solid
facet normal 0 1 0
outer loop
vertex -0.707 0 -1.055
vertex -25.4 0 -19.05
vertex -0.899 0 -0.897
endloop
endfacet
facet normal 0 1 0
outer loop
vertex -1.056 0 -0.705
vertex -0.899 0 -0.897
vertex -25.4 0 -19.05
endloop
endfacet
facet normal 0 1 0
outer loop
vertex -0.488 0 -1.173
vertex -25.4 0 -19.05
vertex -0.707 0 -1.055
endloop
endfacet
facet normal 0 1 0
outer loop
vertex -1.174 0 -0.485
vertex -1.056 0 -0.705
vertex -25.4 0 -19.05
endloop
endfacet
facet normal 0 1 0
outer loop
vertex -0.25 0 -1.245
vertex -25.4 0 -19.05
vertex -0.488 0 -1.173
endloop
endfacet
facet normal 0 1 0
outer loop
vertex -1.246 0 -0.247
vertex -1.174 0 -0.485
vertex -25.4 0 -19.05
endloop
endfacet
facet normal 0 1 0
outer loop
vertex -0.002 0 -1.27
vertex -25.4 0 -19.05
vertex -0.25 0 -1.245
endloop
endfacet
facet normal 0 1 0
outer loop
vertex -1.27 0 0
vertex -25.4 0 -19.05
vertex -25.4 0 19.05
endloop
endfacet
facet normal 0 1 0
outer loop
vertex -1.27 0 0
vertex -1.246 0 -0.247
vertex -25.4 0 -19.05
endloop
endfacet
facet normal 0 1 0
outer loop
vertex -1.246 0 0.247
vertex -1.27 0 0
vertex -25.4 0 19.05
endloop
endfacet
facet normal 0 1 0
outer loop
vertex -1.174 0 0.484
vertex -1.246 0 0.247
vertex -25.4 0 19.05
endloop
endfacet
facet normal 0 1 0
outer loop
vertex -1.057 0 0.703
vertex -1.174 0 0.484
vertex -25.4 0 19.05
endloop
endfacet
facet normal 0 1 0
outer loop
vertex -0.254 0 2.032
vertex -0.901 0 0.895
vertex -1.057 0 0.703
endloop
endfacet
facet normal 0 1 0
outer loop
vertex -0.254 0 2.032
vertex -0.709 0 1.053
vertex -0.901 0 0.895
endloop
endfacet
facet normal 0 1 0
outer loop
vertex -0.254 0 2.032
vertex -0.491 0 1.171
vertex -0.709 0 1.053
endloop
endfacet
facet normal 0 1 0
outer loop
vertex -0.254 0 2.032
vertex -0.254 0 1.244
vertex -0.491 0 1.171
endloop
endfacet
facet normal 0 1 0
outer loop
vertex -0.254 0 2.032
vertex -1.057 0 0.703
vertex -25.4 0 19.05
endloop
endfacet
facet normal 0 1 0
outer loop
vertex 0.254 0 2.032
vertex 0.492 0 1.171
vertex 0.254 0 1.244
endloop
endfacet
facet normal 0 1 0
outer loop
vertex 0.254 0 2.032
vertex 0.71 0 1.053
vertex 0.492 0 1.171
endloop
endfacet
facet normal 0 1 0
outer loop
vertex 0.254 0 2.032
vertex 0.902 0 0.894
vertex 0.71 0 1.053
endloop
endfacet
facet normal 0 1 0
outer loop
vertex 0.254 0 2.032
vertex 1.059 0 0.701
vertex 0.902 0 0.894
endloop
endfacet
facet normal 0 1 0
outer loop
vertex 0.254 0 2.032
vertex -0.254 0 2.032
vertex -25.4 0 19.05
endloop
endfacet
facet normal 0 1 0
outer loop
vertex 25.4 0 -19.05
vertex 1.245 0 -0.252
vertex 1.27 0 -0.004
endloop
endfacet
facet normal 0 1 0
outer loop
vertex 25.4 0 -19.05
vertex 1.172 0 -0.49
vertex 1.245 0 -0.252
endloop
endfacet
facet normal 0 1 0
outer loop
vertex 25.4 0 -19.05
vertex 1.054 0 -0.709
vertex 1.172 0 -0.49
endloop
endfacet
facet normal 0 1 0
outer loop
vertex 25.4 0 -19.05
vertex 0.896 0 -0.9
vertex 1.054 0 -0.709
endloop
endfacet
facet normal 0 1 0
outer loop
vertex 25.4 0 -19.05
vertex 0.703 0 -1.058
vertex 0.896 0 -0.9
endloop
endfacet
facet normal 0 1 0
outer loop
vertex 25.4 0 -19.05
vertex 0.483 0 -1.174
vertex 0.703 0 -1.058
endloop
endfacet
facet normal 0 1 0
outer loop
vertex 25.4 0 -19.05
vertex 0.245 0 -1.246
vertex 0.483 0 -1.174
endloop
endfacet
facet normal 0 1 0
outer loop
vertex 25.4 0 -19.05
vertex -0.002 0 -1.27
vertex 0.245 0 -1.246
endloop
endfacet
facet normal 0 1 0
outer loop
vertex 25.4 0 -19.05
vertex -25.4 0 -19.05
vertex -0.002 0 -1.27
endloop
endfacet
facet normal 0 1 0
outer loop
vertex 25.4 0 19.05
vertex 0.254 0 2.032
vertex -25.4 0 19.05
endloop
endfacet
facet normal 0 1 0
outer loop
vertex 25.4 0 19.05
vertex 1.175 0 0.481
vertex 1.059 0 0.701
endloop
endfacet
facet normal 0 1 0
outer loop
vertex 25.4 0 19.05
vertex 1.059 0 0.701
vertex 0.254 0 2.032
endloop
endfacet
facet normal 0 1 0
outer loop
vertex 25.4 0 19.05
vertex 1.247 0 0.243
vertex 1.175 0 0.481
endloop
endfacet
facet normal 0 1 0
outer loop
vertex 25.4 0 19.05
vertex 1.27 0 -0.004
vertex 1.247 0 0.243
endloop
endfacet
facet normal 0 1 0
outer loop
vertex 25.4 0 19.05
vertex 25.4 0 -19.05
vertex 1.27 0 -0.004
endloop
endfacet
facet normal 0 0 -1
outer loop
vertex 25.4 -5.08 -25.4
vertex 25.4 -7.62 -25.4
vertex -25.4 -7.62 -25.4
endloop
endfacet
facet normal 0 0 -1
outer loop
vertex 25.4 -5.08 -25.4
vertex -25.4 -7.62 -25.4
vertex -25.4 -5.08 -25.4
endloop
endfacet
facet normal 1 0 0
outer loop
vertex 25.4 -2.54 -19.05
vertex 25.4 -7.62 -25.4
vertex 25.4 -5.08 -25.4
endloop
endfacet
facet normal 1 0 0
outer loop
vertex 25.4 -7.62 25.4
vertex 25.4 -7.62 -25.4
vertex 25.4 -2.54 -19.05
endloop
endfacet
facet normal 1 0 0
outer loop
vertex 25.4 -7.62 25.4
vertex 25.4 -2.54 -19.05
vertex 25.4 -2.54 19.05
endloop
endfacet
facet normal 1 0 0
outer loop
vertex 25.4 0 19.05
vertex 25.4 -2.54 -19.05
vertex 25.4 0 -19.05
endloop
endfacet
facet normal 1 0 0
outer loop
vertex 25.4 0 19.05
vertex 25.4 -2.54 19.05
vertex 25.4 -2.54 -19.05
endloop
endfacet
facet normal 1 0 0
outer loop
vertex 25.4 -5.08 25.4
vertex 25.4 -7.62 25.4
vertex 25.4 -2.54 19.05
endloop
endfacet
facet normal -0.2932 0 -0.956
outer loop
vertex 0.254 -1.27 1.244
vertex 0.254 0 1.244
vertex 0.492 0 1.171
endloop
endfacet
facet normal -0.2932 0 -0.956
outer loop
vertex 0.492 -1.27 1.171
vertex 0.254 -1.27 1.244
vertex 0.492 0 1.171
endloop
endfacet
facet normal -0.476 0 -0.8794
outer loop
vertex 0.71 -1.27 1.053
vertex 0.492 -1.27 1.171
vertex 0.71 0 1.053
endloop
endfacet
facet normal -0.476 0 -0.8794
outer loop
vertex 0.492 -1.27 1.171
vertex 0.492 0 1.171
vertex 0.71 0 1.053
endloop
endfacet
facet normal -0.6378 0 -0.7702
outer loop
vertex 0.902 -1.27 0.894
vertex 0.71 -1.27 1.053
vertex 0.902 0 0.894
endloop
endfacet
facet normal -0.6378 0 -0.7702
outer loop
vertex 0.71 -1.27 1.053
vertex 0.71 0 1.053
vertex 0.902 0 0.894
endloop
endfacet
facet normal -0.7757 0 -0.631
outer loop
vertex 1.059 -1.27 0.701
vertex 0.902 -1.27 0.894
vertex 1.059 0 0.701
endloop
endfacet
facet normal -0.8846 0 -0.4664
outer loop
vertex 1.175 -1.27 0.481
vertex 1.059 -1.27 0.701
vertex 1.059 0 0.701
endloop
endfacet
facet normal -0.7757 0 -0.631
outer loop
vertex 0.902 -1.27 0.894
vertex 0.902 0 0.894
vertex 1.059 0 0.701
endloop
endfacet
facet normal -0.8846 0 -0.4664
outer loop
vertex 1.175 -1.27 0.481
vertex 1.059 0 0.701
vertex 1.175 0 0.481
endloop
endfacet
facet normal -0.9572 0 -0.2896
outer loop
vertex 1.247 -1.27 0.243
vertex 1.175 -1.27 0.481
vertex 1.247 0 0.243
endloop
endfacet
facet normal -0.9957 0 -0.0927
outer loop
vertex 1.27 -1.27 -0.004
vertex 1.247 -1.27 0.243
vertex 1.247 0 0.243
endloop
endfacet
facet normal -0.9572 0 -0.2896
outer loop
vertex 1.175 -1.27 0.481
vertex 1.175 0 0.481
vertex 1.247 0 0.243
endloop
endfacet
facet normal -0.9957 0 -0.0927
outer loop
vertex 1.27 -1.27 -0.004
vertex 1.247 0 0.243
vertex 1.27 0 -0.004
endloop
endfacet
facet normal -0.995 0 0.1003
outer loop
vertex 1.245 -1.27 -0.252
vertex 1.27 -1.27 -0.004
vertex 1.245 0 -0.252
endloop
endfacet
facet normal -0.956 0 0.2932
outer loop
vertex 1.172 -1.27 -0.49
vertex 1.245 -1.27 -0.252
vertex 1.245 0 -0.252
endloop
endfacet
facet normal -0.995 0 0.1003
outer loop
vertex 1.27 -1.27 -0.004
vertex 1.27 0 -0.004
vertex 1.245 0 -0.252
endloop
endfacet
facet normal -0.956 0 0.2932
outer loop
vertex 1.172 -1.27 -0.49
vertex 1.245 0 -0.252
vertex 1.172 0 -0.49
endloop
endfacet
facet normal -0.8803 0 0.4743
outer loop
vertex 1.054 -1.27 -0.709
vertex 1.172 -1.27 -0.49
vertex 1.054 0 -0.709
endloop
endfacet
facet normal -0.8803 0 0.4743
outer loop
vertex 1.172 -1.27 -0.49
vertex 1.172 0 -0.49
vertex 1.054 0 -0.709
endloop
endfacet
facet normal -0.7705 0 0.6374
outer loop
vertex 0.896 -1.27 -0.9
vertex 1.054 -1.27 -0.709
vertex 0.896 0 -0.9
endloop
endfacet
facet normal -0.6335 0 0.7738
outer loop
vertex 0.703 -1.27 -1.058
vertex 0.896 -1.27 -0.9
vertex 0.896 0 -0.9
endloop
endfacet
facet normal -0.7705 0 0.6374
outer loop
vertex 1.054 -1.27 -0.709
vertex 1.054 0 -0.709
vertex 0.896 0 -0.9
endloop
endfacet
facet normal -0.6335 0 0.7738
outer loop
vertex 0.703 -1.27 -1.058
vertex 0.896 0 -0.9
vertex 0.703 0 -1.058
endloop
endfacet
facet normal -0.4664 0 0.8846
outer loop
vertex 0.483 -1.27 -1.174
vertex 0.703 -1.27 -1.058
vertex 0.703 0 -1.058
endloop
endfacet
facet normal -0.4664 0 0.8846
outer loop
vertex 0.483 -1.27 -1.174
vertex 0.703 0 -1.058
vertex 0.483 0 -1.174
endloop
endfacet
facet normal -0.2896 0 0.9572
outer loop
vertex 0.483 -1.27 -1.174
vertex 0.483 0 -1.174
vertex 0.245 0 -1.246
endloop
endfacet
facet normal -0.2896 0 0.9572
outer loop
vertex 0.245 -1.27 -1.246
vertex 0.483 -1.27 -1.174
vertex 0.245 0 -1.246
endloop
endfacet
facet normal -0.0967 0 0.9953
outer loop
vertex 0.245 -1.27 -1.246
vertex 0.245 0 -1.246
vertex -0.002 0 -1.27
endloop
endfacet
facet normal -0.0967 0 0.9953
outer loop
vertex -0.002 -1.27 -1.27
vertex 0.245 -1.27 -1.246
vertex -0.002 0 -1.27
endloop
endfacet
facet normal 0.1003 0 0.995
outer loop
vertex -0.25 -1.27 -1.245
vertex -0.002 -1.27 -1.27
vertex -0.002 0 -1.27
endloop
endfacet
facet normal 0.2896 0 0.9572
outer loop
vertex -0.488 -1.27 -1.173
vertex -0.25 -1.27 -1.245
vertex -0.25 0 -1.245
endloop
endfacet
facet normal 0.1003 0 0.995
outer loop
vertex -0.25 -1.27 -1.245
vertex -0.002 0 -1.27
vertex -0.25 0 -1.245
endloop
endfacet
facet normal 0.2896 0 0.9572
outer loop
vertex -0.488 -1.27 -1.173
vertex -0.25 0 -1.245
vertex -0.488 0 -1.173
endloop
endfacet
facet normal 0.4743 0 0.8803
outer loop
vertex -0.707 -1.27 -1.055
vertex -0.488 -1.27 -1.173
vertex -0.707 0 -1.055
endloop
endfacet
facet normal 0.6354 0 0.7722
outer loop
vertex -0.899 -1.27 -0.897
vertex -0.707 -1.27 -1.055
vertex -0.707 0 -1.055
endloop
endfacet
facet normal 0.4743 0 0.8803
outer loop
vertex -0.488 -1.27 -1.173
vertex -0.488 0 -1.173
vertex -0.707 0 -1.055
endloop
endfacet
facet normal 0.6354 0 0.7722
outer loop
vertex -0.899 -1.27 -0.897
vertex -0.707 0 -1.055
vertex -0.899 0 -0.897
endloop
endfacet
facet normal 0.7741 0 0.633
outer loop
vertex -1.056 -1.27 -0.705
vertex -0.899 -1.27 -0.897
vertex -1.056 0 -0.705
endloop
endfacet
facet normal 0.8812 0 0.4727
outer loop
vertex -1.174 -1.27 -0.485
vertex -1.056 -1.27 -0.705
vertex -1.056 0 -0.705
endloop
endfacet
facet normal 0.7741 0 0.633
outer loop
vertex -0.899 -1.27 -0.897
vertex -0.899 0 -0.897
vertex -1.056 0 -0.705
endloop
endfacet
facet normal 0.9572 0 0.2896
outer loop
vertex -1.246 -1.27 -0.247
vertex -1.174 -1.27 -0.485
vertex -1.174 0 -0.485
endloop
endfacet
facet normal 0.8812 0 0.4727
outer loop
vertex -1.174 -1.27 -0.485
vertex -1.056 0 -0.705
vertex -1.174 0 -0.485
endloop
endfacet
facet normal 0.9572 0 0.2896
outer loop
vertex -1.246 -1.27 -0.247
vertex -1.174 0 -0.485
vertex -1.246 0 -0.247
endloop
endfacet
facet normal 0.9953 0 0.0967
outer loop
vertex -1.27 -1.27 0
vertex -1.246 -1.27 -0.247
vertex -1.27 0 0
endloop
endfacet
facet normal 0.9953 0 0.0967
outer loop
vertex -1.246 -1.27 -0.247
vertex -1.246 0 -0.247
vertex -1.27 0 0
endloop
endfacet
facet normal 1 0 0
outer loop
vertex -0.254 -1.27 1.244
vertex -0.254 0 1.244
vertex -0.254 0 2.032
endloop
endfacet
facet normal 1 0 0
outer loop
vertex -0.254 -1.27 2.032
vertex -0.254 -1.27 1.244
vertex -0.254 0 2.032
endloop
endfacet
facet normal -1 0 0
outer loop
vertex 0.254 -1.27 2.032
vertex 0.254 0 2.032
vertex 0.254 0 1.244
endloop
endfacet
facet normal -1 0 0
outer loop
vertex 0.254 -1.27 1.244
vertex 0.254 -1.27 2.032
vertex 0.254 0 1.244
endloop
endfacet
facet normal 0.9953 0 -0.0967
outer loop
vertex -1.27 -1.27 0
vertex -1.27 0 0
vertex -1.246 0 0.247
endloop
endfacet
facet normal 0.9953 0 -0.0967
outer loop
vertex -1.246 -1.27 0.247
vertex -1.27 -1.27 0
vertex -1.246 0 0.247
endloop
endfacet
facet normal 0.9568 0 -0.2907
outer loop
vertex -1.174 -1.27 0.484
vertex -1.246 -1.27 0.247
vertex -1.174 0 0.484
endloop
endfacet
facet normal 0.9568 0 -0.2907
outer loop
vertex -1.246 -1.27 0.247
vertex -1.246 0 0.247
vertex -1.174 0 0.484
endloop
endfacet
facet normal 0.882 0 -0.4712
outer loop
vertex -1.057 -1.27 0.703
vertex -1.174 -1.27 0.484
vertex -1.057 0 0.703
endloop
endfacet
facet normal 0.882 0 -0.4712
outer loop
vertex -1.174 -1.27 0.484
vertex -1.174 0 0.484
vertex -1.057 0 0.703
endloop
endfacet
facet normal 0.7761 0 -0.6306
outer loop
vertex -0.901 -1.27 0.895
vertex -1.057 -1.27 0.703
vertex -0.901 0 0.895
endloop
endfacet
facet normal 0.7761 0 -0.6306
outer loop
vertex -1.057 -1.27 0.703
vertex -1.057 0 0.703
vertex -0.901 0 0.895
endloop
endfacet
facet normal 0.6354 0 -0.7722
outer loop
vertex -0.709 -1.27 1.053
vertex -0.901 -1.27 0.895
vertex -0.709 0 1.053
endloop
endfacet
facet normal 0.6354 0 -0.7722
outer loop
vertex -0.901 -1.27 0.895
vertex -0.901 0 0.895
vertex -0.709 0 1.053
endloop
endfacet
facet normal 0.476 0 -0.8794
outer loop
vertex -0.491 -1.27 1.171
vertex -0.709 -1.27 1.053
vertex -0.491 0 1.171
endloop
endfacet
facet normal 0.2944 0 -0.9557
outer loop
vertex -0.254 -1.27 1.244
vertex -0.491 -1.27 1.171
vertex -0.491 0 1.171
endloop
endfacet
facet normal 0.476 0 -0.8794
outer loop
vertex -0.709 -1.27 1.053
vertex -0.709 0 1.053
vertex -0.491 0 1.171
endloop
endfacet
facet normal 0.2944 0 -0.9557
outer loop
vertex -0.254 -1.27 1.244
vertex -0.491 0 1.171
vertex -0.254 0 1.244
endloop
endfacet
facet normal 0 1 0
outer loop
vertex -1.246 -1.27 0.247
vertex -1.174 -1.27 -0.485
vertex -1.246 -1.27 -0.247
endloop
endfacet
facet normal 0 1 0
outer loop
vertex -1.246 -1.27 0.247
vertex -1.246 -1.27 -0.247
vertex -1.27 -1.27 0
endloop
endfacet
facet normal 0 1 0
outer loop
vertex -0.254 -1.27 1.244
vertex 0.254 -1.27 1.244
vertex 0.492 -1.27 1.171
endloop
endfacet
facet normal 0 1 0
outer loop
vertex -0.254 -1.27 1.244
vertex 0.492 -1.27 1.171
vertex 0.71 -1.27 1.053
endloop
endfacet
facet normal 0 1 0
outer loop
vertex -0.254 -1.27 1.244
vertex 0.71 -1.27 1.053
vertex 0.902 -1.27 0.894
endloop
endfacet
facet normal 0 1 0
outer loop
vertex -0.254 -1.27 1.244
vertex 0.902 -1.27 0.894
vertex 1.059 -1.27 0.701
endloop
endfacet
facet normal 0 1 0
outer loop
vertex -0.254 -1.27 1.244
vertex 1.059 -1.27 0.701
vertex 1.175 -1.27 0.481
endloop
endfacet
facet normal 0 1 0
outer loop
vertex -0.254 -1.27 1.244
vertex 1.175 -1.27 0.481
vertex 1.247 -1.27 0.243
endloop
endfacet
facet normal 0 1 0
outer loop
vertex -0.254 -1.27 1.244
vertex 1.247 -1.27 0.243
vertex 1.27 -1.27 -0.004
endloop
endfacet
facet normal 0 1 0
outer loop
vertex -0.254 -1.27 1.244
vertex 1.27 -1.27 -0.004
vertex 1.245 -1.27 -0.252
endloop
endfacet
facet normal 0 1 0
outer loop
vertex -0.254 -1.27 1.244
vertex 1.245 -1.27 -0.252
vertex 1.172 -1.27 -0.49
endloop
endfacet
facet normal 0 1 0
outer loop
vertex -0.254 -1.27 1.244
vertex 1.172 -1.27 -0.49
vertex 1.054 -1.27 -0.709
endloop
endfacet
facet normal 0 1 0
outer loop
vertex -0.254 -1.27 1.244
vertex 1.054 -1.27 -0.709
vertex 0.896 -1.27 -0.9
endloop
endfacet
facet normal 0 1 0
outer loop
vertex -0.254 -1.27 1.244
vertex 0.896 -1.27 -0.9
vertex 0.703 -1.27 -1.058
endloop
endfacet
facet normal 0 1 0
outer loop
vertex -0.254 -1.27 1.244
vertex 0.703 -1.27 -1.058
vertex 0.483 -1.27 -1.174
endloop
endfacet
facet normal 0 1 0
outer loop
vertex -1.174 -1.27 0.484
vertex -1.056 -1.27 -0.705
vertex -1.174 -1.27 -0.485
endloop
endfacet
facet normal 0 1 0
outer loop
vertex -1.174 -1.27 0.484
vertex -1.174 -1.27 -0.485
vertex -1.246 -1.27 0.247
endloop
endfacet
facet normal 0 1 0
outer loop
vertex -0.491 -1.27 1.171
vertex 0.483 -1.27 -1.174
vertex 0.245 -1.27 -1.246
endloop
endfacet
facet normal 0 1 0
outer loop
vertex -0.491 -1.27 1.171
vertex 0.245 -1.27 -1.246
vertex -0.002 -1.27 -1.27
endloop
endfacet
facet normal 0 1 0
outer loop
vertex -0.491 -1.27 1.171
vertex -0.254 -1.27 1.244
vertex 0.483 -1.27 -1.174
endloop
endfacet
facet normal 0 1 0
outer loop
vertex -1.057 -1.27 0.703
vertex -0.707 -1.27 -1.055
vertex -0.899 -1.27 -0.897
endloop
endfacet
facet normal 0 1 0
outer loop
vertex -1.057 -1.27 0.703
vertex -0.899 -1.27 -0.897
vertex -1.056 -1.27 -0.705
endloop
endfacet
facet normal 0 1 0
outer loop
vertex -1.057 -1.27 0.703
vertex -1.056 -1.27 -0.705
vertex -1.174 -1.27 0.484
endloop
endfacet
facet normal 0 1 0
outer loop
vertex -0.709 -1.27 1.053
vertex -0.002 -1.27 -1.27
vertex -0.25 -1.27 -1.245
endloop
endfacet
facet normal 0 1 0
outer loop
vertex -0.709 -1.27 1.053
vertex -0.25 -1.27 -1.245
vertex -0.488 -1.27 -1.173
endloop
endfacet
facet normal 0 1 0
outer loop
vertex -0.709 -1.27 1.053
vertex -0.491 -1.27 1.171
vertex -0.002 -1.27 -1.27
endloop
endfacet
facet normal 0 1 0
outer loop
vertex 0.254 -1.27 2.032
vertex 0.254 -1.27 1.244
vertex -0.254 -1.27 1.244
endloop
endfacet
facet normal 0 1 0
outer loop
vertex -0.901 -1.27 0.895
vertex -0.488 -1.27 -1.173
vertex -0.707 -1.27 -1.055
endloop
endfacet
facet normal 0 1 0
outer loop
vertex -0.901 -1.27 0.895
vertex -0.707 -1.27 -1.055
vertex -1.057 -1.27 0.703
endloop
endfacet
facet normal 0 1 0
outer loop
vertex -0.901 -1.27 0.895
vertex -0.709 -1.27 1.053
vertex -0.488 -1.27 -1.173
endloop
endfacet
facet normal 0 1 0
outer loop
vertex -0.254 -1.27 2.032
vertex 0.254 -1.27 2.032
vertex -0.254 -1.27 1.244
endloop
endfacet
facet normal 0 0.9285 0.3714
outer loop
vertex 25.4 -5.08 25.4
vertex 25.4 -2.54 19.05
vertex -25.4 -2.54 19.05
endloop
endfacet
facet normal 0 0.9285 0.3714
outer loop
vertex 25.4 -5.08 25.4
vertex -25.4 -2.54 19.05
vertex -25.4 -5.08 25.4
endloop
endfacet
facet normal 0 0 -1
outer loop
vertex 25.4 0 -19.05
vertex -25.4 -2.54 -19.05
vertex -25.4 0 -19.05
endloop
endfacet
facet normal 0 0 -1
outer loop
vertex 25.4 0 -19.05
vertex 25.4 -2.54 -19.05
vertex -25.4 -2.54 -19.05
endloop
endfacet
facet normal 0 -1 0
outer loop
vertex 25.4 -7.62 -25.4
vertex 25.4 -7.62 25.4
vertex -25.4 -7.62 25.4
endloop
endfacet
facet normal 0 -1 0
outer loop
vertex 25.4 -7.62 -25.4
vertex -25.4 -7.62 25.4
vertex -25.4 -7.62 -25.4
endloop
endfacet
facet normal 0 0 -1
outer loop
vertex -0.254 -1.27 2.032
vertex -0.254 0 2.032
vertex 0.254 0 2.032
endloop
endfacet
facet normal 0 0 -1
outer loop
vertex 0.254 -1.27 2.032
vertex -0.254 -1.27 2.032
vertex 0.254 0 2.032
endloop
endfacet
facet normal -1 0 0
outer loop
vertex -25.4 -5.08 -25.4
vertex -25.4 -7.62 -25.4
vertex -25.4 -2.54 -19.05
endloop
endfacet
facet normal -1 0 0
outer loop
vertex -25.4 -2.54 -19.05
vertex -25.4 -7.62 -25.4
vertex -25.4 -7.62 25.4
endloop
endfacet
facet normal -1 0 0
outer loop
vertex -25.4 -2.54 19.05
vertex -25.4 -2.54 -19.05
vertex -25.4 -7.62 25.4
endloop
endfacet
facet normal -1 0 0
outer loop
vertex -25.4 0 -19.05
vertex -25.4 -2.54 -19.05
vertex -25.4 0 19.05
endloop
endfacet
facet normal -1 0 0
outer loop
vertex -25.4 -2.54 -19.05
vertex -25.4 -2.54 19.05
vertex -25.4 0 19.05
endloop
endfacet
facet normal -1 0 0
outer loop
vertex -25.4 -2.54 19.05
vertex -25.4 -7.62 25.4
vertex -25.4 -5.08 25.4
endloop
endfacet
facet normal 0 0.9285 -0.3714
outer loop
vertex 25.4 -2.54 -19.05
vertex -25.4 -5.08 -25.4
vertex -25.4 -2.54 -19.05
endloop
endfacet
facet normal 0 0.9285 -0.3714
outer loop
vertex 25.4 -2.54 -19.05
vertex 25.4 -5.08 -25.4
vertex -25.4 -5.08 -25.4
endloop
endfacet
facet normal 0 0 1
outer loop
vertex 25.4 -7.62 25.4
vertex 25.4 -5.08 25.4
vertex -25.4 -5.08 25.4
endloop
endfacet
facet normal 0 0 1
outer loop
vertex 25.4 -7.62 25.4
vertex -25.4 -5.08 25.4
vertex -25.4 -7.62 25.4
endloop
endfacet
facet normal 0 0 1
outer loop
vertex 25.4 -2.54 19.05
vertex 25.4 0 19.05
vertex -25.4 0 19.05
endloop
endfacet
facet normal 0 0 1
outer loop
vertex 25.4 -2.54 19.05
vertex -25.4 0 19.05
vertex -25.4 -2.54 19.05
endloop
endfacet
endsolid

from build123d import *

# Parameters (mm, degrees)
F1_DEPTH = 25.4
F2_DEPTH = 25.4
F4_DEPTH = 1.27


with BuildPart() as f1:
    # F0 (on Right) → F1 (new body)
    with BuildSketch(Plane.YZ):
        Polygon((0, -19.05), (0, 0), (0, 19.05), (-2.54, 19.05), (-5.08, 25.4), (-7.62, 25.4), (-7.62, -25.4), (-5.08, -25.4), (-2.54, -19.05), align=None)
    extrude(amount=F1_DEPTH)

    # F0 (on Right) → F2 (join)
    with BuildSketch(Plane.YZ):
        Polygon((0, -19.05), (0, 0), (0, 19.05), (-2.54, 19.05), (-5.08, 25.4), (-7.62, 25.4), (-7.62, -25.4), (-5.08, -25.4), (-2.54, -19.05), align=None)
    extrude(amount=-F2_DEPTH)

    # F3 (on face) → F4 (cut)
    with BuildSketch(Plane(origin=(0, 0, 0), x_dir=(-1, 0, 0), z_dir=(0, 1, 0))):
        with BuildLine():
            ThreePointArc((-0.254, 1.2443407893), (-0.8032185257, -0.9837377699), (1.27, 0))
            ThreePointArc((1.27, 0), (0.9837377699, 0.8032185257), (0.254, 1.2443407893))
            Line((0.254, 1.2443407893), (0.254, 1.016))
            Line((0.254, 1.016), (-0.254, 1.016))
            Line((-0.254, 1.016), (-0.254, 1.2443407893))
        make_face()
        with BuildLine():
            Line((0.254, 1.016), (0.254, 1.2443407893))
            ThreePointArc((0.254, 1.2443407893), (0, 1.27), (-0.254, 1.2443407893))
            Line((-0.254, 1.2443407893), (-0.254, 1.016))
            Line((-0.254, 1.016), (0.254, 1.016))
        make_face()
        with BuildLine():
            ThreePointArc((-0.254, 1.2443407893), (0, 1.27), (0.254, 1.2443407893))
            Line((0.254, 1.2443407893), (0.254, 2.032))
            Line((0.254, 2.032), (-0.254, 2.032))
            Line((-0.254, 2.032), (-0.254, 1.2443407893))
        make_face()
    extrude(amount=-F4_DEPTH, mode=Mode.SUBTRACT)


solid = f1.part
